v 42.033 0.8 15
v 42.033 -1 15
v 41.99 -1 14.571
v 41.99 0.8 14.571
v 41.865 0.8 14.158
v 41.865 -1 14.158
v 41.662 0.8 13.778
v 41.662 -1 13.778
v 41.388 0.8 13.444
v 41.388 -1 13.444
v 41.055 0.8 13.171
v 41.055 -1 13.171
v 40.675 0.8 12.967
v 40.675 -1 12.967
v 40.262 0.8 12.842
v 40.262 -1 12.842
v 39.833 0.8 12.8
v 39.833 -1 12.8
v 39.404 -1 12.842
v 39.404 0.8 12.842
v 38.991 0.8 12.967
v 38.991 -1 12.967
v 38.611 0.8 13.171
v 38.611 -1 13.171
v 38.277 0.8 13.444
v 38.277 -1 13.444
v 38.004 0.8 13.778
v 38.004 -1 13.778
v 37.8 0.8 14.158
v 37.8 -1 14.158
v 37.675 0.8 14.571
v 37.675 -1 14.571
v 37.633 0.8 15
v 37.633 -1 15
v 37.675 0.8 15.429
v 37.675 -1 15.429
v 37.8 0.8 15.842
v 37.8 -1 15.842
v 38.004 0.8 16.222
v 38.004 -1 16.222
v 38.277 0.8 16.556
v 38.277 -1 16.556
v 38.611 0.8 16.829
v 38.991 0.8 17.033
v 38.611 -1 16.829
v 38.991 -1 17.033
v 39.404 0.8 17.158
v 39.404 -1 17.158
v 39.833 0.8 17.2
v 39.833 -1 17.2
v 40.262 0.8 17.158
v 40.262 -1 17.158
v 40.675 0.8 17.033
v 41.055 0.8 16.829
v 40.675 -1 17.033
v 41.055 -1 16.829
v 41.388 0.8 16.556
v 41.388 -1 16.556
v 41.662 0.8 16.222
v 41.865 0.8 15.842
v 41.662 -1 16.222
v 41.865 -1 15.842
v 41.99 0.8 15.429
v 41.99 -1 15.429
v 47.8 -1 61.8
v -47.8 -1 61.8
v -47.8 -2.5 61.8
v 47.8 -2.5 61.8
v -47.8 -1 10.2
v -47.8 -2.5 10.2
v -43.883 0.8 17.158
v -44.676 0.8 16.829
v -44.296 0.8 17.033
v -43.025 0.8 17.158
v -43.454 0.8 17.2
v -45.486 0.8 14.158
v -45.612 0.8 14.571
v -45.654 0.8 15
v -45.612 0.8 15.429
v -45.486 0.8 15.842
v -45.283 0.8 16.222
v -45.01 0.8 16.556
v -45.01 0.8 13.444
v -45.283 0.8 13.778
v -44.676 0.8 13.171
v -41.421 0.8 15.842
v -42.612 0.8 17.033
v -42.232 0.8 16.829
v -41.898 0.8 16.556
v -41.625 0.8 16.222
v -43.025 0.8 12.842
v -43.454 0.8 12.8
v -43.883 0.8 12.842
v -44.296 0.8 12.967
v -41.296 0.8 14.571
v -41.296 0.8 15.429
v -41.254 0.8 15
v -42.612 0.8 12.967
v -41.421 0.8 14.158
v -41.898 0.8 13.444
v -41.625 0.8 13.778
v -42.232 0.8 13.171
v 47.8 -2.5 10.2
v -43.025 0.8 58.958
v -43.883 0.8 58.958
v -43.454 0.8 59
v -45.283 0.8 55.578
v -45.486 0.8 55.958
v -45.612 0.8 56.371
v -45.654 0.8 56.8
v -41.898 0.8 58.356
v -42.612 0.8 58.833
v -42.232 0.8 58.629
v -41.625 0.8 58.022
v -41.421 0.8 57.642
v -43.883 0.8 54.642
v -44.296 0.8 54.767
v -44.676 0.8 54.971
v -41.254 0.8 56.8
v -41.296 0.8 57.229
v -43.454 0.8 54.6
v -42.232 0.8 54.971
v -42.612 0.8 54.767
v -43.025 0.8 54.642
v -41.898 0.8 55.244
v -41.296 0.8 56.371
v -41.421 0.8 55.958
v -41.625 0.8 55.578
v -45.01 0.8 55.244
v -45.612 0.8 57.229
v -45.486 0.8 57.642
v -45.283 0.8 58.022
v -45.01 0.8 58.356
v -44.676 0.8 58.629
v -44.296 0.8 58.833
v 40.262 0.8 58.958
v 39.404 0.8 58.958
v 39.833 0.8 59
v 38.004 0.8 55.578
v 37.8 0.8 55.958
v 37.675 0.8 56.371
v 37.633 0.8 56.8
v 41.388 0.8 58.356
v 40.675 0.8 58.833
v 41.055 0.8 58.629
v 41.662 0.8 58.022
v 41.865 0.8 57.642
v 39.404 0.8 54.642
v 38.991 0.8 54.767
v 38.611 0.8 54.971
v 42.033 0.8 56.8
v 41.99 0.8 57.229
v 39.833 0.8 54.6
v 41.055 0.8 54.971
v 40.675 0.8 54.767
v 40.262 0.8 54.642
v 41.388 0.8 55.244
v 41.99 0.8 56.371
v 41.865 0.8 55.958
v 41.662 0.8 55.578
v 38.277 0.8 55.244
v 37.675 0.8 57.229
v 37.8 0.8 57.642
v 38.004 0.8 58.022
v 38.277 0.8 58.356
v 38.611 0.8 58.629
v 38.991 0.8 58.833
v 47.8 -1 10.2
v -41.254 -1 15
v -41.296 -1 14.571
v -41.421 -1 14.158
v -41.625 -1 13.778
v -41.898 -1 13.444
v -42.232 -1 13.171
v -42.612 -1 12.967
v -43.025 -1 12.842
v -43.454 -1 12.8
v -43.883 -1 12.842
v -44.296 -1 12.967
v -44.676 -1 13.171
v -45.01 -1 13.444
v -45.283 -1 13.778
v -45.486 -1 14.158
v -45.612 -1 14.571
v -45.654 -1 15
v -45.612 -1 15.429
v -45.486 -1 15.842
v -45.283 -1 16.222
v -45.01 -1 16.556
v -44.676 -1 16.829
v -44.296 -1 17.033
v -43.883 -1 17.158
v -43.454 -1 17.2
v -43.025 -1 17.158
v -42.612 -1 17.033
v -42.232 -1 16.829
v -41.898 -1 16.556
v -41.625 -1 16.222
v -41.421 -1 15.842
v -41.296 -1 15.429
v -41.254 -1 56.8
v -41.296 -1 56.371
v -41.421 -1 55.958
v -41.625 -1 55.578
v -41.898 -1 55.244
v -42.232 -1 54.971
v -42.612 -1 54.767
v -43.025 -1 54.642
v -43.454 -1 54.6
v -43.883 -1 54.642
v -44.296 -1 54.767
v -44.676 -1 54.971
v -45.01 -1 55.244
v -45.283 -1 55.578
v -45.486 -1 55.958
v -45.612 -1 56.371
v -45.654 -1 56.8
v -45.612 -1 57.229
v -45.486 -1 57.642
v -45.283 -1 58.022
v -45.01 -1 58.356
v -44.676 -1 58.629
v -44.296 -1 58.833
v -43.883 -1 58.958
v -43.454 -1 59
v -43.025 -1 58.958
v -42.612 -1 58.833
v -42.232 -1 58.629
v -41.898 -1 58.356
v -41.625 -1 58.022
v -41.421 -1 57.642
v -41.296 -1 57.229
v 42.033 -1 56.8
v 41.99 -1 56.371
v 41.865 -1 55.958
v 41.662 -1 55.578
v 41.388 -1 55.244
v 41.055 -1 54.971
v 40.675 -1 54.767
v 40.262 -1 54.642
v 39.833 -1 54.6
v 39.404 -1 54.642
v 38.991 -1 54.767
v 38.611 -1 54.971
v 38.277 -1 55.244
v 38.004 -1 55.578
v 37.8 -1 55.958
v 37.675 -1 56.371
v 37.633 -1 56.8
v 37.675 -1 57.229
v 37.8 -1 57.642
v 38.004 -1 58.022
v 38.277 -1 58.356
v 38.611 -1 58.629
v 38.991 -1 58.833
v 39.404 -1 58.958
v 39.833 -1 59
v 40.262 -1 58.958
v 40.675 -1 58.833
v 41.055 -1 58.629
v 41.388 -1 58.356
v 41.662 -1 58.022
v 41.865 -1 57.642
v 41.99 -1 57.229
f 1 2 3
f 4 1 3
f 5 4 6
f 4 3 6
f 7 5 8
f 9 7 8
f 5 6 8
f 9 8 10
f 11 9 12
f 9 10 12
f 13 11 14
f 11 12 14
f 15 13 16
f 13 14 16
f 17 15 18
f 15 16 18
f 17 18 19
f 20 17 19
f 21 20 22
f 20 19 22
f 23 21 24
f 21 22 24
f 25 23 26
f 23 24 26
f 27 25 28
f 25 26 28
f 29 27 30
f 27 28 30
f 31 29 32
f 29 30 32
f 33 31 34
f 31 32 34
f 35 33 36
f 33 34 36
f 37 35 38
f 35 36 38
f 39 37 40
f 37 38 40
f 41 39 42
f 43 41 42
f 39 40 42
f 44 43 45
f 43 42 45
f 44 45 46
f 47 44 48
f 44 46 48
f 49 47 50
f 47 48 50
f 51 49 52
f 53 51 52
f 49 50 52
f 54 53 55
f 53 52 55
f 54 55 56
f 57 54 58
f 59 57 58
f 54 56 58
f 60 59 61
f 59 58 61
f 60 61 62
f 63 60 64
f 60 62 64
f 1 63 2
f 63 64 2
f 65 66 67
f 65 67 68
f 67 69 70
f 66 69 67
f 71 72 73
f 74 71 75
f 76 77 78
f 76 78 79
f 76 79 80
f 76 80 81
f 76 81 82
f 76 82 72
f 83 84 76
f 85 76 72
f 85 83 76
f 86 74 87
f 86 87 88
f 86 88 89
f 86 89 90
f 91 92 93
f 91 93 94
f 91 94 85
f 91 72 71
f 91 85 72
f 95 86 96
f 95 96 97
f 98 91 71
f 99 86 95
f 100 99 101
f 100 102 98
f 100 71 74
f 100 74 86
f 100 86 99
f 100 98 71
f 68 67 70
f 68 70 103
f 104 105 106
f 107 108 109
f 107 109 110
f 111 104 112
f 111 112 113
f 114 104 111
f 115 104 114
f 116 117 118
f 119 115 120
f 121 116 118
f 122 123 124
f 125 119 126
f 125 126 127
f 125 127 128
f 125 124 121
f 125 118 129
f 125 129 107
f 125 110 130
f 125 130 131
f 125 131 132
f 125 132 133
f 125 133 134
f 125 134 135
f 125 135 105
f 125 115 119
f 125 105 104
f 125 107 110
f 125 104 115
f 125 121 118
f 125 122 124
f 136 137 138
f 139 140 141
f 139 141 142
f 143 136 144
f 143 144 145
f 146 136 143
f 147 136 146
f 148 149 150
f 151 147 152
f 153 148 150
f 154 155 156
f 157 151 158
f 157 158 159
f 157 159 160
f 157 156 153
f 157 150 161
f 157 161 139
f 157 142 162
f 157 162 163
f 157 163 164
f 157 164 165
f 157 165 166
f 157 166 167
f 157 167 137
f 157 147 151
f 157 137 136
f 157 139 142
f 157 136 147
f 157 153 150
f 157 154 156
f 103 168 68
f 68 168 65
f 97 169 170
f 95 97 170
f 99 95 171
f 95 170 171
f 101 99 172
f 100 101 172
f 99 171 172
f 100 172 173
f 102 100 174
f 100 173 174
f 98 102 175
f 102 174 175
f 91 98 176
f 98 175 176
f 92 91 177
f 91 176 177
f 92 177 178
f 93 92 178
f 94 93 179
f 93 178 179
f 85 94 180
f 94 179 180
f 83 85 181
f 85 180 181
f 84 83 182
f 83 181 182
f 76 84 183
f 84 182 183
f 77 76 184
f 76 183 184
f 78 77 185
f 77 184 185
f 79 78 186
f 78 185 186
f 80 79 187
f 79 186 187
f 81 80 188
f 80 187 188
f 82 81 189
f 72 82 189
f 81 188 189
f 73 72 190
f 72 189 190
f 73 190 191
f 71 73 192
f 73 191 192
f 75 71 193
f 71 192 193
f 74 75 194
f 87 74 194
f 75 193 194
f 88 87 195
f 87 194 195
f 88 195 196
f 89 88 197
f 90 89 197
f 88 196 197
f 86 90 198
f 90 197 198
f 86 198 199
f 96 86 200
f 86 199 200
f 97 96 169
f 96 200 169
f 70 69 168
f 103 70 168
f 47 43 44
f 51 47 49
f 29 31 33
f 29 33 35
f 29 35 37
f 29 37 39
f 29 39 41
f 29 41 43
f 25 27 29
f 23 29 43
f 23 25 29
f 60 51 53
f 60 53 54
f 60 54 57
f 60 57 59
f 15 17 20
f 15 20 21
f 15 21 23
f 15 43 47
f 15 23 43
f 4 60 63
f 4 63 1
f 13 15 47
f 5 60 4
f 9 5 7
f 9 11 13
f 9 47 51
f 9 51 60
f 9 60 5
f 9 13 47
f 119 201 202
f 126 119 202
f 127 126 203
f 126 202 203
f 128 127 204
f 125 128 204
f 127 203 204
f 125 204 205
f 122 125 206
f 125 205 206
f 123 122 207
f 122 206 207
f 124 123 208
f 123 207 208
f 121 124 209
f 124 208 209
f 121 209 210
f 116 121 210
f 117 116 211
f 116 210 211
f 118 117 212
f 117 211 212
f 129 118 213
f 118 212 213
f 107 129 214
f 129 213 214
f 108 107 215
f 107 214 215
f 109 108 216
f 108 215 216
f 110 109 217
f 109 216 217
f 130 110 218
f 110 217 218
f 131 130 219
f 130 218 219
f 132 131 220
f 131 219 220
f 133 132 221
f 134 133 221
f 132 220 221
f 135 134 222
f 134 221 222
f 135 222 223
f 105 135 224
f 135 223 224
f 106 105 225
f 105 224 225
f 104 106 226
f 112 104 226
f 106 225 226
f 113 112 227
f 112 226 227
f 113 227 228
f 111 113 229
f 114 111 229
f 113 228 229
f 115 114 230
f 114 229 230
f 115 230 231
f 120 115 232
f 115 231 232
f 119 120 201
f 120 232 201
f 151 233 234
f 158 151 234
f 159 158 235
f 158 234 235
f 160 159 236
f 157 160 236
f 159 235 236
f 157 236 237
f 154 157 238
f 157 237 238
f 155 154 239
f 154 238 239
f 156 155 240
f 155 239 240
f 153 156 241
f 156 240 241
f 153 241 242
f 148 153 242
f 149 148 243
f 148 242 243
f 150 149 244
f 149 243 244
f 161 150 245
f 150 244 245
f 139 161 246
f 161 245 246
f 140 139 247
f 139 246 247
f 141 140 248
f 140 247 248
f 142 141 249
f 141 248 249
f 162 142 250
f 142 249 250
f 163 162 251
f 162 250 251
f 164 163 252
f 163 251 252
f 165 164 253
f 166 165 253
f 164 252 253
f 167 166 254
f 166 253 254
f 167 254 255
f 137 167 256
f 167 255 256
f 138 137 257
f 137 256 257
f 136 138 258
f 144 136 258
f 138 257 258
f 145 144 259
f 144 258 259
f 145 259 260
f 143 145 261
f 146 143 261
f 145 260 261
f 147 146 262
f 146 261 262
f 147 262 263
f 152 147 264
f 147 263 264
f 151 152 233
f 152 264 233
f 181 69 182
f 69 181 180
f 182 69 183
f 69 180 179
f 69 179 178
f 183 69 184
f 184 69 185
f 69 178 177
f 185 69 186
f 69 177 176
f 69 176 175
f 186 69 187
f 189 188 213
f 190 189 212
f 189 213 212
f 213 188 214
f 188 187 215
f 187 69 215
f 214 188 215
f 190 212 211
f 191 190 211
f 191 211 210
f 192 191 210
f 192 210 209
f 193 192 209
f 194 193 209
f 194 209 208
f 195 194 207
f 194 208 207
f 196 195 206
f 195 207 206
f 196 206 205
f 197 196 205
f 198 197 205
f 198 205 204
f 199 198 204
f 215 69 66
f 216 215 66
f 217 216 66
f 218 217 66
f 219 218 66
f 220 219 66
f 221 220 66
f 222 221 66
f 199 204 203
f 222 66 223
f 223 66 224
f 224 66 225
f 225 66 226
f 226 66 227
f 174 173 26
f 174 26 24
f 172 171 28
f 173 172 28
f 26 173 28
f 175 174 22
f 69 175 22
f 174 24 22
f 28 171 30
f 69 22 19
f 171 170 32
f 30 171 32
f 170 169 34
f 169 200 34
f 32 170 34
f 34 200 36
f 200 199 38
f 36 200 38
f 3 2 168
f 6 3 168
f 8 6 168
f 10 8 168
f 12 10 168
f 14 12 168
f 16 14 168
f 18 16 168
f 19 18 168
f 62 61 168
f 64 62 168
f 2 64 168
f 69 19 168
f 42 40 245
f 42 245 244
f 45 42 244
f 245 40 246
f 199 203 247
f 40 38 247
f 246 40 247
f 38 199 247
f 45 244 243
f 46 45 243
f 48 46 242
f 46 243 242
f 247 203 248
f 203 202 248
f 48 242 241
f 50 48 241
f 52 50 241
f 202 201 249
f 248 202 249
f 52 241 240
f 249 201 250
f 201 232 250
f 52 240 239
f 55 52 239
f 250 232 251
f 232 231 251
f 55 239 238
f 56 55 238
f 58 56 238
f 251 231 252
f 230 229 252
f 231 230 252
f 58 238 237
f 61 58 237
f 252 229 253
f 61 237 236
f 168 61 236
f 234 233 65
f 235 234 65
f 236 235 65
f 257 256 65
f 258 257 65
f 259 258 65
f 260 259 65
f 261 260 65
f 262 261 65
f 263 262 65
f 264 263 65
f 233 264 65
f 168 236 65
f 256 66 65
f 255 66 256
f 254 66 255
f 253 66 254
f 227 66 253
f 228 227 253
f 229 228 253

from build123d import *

# Parameters (mm, degrees)
SKETCH1_W           = 95.6
SKETCH1_H           = 51.6
BOSS_EXTRUDE1_DEPTH = 1.5
SKETCH2_R           = 2.2
BOSS_EXTRUDE2_DEPTH = 1.8


with BuildPart() as part:
    # Sketch1 → Boss-Extrude1 (new body)
    with BuildSketch(Plane.XZ.offset(1)):
        with Locations((0, 36)):
            Rectangle(SKETCH1_W, SKETCH1_H)
    extrude(amount=BOSS_EXTRUDE1_DEPTH)

    # Sketch2 → Boss-Extrude2 (add)
    with BuildSketch(Plane(origin=(0, -1, 0), x_dir=(1, 0, 0), z_dir=(0, 1, 0))):
        with Locations((-43.453932042, -56.8)):
            Circle(SKETCH2_R)
        with Locations((-43.453932042, -15)):
            Circle(SKETCH2_R)
        with Locations((39.832771039, -15)):
            Circle(SKETCH2_R)
        with Locations((39.832771039, -56.8)):
            Circle(SKETCH2_R)
    extrude(amount=BOSS_EXTRUDE2_DEPTH)


solid = part.part
